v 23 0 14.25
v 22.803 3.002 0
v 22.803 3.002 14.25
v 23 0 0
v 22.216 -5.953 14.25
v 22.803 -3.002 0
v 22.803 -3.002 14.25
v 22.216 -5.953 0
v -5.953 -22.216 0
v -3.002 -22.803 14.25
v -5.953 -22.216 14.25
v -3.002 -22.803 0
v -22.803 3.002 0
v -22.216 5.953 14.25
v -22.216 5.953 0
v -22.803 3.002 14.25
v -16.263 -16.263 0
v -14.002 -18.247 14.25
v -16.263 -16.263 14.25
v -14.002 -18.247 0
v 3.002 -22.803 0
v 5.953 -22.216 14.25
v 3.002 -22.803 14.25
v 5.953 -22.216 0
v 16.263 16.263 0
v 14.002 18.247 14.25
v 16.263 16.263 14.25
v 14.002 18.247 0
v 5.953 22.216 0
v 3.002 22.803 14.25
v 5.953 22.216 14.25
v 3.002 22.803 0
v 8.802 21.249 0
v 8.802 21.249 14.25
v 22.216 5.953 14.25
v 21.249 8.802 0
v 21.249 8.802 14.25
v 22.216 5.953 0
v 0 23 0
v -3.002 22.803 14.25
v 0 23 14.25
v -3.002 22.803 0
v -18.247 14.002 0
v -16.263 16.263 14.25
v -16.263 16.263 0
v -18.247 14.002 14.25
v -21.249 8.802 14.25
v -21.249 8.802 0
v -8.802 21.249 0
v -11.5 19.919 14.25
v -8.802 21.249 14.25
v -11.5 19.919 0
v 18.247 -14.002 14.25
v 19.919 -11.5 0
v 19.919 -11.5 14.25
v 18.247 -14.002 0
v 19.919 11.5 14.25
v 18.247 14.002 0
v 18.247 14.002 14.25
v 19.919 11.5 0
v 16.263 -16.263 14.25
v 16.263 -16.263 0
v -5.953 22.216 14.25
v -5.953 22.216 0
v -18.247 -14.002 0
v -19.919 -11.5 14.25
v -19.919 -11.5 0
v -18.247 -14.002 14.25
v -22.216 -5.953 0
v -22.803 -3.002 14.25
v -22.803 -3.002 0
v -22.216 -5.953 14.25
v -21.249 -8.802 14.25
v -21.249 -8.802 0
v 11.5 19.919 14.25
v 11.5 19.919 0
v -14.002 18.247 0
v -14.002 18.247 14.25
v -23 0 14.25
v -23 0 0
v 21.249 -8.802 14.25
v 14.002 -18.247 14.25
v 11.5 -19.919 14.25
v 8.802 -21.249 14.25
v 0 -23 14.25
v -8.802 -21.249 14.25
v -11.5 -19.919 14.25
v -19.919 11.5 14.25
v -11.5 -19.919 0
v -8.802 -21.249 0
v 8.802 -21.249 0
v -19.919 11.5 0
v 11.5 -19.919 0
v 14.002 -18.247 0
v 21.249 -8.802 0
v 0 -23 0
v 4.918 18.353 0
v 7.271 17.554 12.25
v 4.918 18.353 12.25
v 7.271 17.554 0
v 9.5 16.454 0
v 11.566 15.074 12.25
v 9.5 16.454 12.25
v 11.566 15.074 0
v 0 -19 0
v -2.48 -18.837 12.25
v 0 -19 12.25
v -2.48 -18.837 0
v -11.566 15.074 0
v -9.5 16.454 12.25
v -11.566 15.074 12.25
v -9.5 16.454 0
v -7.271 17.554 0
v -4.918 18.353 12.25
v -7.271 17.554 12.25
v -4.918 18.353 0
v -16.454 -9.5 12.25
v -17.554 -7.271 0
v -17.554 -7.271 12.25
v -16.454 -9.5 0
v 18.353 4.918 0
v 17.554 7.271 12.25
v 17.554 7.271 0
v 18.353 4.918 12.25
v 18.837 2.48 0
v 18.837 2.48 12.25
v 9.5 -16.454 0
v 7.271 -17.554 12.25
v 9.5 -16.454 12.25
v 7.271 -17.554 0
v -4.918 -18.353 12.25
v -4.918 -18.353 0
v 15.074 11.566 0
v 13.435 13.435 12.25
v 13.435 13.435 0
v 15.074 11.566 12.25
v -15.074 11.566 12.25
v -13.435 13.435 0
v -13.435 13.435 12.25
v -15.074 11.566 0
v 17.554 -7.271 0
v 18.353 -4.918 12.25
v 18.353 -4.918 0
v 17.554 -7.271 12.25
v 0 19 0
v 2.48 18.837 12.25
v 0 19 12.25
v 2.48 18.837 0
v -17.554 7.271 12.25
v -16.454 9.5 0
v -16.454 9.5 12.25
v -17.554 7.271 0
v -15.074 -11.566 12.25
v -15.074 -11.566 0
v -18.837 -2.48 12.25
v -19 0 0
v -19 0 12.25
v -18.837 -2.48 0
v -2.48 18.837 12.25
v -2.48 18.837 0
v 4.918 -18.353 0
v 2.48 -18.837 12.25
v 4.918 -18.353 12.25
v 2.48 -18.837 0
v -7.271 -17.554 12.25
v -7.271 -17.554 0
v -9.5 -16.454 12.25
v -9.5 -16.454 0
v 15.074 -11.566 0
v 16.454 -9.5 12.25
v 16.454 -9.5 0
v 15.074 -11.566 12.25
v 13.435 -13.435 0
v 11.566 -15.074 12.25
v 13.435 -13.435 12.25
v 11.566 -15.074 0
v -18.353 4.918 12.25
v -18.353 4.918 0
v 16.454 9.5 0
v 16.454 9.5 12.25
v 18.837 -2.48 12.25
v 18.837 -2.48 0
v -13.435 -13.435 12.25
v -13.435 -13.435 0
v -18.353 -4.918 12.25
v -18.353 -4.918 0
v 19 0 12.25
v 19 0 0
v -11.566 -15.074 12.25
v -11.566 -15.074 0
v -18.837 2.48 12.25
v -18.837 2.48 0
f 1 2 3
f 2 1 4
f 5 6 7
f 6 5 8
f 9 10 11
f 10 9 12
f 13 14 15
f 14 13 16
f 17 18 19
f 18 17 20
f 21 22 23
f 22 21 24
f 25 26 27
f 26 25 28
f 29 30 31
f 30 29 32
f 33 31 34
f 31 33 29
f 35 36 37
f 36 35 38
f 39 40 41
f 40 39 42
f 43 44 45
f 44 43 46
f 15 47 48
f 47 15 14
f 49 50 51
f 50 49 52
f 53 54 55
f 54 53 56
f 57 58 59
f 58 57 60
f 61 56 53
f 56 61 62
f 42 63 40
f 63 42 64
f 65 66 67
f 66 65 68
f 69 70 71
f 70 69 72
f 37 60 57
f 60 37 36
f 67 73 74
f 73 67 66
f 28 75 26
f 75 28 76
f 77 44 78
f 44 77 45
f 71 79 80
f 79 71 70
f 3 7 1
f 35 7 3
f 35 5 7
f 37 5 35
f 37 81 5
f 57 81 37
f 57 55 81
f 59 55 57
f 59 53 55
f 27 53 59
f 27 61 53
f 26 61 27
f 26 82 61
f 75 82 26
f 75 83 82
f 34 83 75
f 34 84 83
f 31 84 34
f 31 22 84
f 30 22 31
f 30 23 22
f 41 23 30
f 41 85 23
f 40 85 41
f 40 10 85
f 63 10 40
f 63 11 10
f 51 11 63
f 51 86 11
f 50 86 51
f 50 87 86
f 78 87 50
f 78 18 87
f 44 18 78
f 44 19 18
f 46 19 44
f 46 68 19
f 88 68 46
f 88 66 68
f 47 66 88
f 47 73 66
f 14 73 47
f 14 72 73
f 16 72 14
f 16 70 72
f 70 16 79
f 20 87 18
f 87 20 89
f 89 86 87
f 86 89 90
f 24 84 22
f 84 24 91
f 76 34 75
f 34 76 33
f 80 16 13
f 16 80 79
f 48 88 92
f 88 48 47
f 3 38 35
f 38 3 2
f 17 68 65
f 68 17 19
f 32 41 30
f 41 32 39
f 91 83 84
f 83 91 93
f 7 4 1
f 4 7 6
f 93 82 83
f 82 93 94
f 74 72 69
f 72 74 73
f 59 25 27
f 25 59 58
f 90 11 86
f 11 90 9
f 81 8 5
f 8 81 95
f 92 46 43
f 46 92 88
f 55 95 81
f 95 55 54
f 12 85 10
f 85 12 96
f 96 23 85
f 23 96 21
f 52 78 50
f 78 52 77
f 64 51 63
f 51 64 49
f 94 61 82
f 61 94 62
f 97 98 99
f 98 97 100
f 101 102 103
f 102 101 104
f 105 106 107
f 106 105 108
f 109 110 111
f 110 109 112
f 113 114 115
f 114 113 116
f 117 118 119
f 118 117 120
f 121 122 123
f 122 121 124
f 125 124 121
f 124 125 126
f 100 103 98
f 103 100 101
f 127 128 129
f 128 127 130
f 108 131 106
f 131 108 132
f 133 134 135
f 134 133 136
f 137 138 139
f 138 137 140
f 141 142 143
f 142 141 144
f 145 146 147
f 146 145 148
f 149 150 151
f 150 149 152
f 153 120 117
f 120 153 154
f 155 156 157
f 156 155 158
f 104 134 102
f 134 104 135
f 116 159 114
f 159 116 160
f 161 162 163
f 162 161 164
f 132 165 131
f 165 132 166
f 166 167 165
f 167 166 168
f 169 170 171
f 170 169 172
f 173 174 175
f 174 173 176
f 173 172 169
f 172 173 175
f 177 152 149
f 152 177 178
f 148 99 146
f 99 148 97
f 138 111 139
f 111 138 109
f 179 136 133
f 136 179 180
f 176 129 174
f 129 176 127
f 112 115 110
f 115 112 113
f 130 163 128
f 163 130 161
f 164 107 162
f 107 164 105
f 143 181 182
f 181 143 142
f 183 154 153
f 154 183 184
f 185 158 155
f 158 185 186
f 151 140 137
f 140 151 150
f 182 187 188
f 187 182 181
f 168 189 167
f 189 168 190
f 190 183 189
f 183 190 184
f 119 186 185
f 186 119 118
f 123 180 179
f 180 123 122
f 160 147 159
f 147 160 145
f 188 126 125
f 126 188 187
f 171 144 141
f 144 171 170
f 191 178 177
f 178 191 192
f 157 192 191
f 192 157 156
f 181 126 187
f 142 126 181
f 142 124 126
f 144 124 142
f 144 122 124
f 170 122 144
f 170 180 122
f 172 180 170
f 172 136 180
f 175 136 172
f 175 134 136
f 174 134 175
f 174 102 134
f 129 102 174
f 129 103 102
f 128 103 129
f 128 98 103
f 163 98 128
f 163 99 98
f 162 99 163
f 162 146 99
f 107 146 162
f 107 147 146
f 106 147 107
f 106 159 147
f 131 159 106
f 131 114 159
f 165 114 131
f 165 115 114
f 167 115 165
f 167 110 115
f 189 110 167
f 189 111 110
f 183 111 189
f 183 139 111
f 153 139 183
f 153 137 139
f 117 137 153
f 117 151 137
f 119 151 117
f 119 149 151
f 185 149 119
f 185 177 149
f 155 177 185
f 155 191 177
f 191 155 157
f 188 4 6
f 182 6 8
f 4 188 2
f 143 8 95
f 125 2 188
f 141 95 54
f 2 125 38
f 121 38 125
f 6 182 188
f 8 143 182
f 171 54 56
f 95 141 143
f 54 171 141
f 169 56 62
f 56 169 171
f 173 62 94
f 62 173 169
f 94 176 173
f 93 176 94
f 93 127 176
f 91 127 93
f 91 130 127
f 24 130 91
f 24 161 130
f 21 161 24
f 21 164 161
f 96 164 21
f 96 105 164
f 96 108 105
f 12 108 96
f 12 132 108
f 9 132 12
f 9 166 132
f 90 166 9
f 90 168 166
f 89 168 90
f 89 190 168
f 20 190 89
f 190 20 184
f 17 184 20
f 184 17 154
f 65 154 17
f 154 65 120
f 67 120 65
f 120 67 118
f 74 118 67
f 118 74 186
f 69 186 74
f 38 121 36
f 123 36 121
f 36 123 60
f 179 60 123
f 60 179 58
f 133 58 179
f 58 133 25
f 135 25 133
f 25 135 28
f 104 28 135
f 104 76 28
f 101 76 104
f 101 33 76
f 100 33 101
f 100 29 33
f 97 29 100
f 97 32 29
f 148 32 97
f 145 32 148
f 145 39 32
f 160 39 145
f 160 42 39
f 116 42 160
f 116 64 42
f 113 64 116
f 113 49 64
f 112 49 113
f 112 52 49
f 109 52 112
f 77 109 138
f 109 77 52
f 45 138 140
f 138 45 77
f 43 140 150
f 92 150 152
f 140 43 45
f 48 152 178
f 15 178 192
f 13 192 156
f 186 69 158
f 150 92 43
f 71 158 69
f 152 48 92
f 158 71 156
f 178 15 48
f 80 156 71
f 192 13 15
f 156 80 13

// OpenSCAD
// file: params.scad
// ==================== source of truth ====================
// Every number below is cross-referenced to either this repo's own simulation
// model (src/robot_cat_description/urdf/cat.urdf.xacro at scale 1.0, and
// robot_cat_gait/leg_ik.py) or to a measurement of a real CAD file - see
// hardware/cad/measure/README.md for the method, the sources and the raw
// numbers.
//
// Nothing here is a guess any more. The two values that used to be flagged
// ADJUSTABLE (the horn bolt circle and a downloaded bracket's flange) were
// replaced by measurements taken off the official STS3215 STEP model, so the
// downloaded bracket is no longer on the critical path at all.

// ---- leg geometry - VERIFIED, must match leg_ik.py exactly ----
thigh_length = 110;   // LegGeometry.thigh_length, axis to axis
calf_length  = 110;   // LegGeometry.calf_length, axis to paw centre
hip_offset   = 25;    // hip roll axis -> thigh pitch axis, lateral
foot_radius  = 12;    // paw pad sphere radius

// ---- trunk geometry - VERIFIED ----
hip_x = 110;          // hip mount, x from body centre (so 220mm hip-to-hip)
hip_y = 55;           // hip mount, y from body centre (so 110mm hip-to-hip)
body_length = 300;
body_width  = 111;
body_height = 141;

// ---- ST3215 / STS3215 servo - MEASURED from the official CAD model
// (TheRobotStudio/SO-ARM100, STEP/SO100/STS3215_03a.step). The shop pages'
// "45.2 x 24.7 x 35" is the CASE only; the model bounding box is 39.6 deep
// because the output boss and the idler boss stand proud of it. Pocket depth
// must use servo_h, clearance above it must allow for servo_boss. ----
servo_l = 45.4;
servo_w = 24.8;
servo_h = 35.4;        // case alone, faces at +/-17.7 from centre
servo_boss_h = 2.3;    // output boss above the case face
servo_boss_d = 22.1;   // raised collar around the output axis, +0.1 clearance
servo_axis_x = 12.5;   // output axis offset from the servo's own centre,
                       // i.e. 10.2mm in from the near end face
servo_fit = 0.4;       // FDM clearance added per side around the pocket

// ---- Raspberry Pi 5 mounting - VERIFIED against the official Raspberry Pi
// Ltd mechanical drawing (RP-008347-DS-1): 58 x 49mm hole spacing, Ø2.7mm
// holes (clearance for M2.5) ----
pi_hole_x = 58;
pi_hole_y = 49;
pi_hole_d = 2.9;       // add a touch over the datasheet 2.7 for FDM tolerance

// ---- servo horn bolt circle - MEASURED, exact
// Four holes, all on ONE circle of radius 7.000mm (diameter 14.00), at 45,
// 135, 225 and 315 degrees - a square of side 9.90mm. Least-squares circle
// fit to the STEP model's analytic CIRCLE entities, residual 0.000mm.
//
// The earlier "three holes at 6.7, one at 5.6" here was wrong. It came from
// misreading OpenRoboticDog's hip_x4.stl, which has no horn circle at all -
// those were the servo's case screws. See measure/README.md.
horn_bolt_r = 7.0;
horn_bolt_d = 2.7;         // M2.5 clearance, model bore is 2.5
horn_hub_d = 9.2;          // Ø9.0 hub on the horn face, +0.2 clearance

// ---- servo case screw positions - MEASURED
// The four screws that hold the servo case together double as mounting
// points: this is how OpenRoboticDog fixes the servo to its frame, and that
// part measures 3.75mm apart against this model's 3.8mm. Positions are given
// relative to the servo centre, on both flanks at y = +/-10.25.
case_screw_y = 10.25;
case_screw_x = [4.2, -16.5, -20.3];
case_screw_d = 2.2;        // M2 clearance; the servo's own bore is 1.5 pilot

// Two of the three are enough to fix a servo, and OpenRoboticDog uses two.
// Which two matters here: taking the pair NEAREST the output axis keeps a
// mounting pad 35mm long instead of 45mm, which is what lets the trunk frame
// stay inside the 300mm body. The outermost screw stays available if a part
// wants all three.
case_screw_x_used = [4.2, -16.5];

// ---- leg segment spines ----
// The rectangular bar between a segment's two end plates. Declared here
// because FOUR files need it and only agreement makes them fit: the segment
// itself, and the cosmetic fairing that snaps over it. A comment saying
// "must match" is not a mechanism.
thigh_spine = [14, 10];
calf_spine  = [12, 9];

// ---- print structure ----
wall = 4;             // load-bearing wall thickness in PETG
insert_d = 4.2;        // M3 brass heat-set insert bore
insert_depth = 6;
$fn = 48;
// main file
// Obudowa stawu, x8. The barrel over every hip and knee.
//
// This replaces joint_cap, and the change is not cosmetic bookkeeping: the
// housing bolts to the servo's IDLE face using the measured 4 x M2.5 on the
// Ø14 circle, closing a yoke around the servo so the joint is carried on
// both sides instead of hanging off the horn alone. That is why it has a 4mm
// wall where the old cap had 1.8.
//
// It is also the strongest thing in the silhouette. On the reference render
// the shoulder and knee housings are as visually important as the body, and
// they are what makes each limb segment read as separate.
//
// Print open side down. No support.
include <shell_lib.scad>

joint_housing();
